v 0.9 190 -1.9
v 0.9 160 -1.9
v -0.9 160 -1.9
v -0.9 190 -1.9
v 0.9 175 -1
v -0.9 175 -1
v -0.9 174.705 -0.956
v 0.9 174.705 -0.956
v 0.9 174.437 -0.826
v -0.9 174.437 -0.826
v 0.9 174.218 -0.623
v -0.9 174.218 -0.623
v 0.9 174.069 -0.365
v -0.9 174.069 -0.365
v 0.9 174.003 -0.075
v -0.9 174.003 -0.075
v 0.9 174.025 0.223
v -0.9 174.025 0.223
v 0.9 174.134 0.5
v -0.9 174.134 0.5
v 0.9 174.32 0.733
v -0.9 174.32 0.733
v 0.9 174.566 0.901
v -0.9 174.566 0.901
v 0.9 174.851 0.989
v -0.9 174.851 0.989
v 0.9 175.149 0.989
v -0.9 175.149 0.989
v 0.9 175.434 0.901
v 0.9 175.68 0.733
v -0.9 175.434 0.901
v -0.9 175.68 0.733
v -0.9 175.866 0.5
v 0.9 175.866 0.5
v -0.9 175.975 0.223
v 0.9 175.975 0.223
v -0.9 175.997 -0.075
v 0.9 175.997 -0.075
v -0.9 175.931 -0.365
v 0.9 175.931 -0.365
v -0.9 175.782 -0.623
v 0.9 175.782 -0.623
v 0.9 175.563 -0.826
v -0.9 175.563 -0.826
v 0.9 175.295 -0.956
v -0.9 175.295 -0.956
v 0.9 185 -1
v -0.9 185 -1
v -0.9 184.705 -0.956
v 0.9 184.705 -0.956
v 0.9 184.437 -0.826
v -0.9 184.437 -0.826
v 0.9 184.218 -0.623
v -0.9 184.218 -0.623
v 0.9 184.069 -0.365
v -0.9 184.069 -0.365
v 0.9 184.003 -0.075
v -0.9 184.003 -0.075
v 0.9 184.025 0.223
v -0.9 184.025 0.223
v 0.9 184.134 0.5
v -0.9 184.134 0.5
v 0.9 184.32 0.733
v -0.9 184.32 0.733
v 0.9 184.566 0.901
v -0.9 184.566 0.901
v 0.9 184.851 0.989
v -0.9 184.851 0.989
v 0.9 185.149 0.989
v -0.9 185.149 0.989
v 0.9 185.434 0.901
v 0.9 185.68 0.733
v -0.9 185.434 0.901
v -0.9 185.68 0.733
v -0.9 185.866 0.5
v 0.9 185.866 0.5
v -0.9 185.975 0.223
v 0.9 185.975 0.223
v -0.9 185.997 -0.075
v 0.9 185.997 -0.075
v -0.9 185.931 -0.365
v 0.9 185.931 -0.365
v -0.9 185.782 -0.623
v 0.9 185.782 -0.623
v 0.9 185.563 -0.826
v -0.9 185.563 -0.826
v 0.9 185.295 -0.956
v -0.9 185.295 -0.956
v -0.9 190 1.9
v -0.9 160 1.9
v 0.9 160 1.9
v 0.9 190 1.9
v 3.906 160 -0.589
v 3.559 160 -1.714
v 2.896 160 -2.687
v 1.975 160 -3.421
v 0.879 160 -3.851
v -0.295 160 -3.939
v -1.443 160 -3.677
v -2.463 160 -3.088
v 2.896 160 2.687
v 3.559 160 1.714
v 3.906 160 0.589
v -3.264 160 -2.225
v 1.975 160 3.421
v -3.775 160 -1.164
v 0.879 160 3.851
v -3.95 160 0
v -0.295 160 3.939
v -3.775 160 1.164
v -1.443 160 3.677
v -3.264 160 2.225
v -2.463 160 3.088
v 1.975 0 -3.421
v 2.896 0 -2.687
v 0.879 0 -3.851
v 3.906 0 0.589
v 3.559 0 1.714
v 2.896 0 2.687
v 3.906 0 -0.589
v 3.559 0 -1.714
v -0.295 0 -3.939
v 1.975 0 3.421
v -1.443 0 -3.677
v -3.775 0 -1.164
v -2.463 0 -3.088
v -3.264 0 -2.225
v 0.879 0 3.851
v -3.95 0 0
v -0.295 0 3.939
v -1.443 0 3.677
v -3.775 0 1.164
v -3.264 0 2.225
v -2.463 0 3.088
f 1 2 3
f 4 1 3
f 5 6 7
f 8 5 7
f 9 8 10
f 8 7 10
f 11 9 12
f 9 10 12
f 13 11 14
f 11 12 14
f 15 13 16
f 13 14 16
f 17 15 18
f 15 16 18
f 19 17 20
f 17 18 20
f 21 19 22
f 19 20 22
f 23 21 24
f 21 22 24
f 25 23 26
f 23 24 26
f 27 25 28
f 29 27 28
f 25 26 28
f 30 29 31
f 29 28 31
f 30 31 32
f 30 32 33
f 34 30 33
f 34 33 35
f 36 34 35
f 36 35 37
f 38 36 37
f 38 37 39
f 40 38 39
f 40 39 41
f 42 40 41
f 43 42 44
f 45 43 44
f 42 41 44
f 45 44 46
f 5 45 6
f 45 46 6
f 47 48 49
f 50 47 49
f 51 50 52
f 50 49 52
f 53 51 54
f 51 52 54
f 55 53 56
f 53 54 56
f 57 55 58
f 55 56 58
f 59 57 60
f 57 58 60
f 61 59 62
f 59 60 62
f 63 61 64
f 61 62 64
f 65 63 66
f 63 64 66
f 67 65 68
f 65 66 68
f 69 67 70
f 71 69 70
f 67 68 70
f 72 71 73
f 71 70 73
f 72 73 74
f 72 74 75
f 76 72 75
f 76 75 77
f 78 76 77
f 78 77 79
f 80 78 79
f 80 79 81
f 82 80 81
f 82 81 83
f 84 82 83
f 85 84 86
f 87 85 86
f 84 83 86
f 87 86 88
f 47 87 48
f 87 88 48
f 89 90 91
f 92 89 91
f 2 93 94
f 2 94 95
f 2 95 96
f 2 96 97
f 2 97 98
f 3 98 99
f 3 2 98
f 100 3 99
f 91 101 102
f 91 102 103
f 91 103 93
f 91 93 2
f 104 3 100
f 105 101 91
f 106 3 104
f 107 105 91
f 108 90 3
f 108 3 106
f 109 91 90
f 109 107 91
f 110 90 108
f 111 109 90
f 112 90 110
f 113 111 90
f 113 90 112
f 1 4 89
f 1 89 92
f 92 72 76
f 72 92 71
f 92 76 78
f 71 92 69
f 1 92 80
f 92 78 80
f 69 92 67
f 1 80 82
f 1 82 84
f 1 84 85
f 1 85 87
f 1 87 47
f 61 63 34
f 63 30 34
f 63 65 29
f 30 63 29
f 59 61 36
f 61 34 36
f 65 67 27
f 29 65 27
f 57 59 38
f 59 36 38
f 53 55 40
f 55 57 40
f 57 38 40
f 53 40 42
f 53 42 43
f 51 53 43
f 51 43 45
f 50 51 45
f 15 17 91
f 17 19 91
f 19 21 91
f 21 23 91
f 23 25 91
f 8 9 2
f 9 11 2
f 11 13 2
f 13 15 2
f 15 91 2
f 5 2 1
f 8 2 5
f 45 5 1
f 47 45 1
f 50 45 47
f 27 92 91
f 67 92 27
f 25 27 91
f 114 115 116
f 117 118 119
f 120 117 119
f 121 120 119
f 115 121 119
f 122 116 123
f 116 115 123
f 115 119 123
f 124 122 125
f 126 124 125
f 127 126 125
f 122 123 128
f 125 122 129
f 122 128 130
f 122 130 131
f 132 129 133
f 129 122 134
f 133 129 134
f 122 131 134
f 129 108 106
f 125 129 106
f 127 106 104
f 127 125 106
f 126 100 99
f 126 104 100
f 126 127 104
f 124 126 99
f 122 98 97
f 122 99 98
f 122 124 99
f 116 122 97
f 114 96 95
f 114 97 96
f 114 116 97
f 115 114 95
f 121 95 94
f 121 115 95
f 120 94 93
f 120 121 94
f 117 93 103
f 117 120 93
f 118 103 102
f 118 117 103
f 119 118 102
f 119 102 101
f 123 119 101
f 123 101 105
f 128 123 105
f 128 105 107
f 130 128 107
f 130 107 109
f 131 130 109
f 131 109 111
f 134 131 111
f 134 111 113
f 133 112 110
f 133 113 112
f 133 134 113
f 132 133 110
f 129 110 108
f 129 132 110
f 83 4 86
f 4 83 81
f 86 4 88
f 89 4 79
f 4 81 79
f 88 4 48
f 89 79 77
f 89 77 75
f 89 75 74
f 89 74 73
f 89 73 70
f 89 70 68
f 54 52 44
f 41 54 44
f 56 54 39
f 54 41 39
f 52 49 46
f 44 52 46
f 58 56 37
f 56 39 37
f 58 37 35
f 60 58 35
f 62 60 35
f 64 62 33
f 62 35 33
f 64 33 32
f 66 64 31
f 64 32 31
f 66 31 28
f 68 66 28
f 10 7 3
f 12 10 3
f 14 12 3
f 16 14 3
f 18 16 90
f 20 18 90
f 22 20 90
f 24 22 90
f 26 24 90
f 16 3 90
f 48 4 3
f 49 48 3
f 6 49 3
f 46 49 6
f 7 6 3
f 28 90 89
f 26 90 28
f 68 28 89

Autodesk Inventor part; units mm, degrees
ref_plane "YZ Plane" through (0, 0, 0) normal (1, 0, 0) x (0, 1, 0)
ref_plane "XZ Plane" through (0, 0, 0) normal (0, 1, 0) x (-1, 0, 0)
ref_plane "XY Plane" through (0, 0, 0) normal (0, 0, 1) x (1, 0, 0)
sketch "Sketch1" plane through (0, 0, 0) normal (0, 1, 0) x (-1, 0, 0)
  circle A0 centre (0, 0) radius 3.95
  dimension "d0" = 7.9
extrude "Extrusion1" add sketch "Sketch1" along normal blind 160
sketch "Sketch2" plane through (0, 160, 0) normal (0, 1, 0) x (1, 0, 0)
  line L0 (-0.9, -1.9) -> (0.9, -1.9)
  line L1 (0.9, -1.9) -> (0.9, 1.9)
  line L2 (0.9, 1.9) -> (-0.9, 1.9)
  line L3 (-0.9, 1.9) -> (-0.9, -1.9)
  line L4 (-0.9, -1.9) -> (0.9, 1.9) construction
  line L5 (0.9, -1.9) -> (-0.9, 1.9) construction
  point P0 (0, 0)
  dimension "d3" = 3.8
  dimension "d4" = 1.8
extrude "Extrusion2" add sketch "Sketch2" along normal blind 30
sketch "Sketch3" plane through (0.9, 160, 1.9) normal (1, 0, 0) x (0, 0, -1)
  line L0 (0, 30) -> (3.8, 30) projected
  line L1 (1.9, 30) -> (1.9, 25)
  circle A0 centre (1.9, 25) radius 1.1
  line L2 (1.9, 25) -> (1.9, 15)
  line L3 (3.8, 0) -> (3.8, 30) projected
  circle A1 centre (1.9, 15) radius 1.1
  point P0 (1.9, -160)
  dimension "d7" = 5
  dimension "d8" = 2.2
  dimension "d9" = 10
  dimension "d10" = 2.2
hole "Hole1" at (0.9, 185, 0) at (0.9, 175, 0) direction (-1, 0, 0) diameter 2 end through all
properties part number "Stereotax adaptor v4"
